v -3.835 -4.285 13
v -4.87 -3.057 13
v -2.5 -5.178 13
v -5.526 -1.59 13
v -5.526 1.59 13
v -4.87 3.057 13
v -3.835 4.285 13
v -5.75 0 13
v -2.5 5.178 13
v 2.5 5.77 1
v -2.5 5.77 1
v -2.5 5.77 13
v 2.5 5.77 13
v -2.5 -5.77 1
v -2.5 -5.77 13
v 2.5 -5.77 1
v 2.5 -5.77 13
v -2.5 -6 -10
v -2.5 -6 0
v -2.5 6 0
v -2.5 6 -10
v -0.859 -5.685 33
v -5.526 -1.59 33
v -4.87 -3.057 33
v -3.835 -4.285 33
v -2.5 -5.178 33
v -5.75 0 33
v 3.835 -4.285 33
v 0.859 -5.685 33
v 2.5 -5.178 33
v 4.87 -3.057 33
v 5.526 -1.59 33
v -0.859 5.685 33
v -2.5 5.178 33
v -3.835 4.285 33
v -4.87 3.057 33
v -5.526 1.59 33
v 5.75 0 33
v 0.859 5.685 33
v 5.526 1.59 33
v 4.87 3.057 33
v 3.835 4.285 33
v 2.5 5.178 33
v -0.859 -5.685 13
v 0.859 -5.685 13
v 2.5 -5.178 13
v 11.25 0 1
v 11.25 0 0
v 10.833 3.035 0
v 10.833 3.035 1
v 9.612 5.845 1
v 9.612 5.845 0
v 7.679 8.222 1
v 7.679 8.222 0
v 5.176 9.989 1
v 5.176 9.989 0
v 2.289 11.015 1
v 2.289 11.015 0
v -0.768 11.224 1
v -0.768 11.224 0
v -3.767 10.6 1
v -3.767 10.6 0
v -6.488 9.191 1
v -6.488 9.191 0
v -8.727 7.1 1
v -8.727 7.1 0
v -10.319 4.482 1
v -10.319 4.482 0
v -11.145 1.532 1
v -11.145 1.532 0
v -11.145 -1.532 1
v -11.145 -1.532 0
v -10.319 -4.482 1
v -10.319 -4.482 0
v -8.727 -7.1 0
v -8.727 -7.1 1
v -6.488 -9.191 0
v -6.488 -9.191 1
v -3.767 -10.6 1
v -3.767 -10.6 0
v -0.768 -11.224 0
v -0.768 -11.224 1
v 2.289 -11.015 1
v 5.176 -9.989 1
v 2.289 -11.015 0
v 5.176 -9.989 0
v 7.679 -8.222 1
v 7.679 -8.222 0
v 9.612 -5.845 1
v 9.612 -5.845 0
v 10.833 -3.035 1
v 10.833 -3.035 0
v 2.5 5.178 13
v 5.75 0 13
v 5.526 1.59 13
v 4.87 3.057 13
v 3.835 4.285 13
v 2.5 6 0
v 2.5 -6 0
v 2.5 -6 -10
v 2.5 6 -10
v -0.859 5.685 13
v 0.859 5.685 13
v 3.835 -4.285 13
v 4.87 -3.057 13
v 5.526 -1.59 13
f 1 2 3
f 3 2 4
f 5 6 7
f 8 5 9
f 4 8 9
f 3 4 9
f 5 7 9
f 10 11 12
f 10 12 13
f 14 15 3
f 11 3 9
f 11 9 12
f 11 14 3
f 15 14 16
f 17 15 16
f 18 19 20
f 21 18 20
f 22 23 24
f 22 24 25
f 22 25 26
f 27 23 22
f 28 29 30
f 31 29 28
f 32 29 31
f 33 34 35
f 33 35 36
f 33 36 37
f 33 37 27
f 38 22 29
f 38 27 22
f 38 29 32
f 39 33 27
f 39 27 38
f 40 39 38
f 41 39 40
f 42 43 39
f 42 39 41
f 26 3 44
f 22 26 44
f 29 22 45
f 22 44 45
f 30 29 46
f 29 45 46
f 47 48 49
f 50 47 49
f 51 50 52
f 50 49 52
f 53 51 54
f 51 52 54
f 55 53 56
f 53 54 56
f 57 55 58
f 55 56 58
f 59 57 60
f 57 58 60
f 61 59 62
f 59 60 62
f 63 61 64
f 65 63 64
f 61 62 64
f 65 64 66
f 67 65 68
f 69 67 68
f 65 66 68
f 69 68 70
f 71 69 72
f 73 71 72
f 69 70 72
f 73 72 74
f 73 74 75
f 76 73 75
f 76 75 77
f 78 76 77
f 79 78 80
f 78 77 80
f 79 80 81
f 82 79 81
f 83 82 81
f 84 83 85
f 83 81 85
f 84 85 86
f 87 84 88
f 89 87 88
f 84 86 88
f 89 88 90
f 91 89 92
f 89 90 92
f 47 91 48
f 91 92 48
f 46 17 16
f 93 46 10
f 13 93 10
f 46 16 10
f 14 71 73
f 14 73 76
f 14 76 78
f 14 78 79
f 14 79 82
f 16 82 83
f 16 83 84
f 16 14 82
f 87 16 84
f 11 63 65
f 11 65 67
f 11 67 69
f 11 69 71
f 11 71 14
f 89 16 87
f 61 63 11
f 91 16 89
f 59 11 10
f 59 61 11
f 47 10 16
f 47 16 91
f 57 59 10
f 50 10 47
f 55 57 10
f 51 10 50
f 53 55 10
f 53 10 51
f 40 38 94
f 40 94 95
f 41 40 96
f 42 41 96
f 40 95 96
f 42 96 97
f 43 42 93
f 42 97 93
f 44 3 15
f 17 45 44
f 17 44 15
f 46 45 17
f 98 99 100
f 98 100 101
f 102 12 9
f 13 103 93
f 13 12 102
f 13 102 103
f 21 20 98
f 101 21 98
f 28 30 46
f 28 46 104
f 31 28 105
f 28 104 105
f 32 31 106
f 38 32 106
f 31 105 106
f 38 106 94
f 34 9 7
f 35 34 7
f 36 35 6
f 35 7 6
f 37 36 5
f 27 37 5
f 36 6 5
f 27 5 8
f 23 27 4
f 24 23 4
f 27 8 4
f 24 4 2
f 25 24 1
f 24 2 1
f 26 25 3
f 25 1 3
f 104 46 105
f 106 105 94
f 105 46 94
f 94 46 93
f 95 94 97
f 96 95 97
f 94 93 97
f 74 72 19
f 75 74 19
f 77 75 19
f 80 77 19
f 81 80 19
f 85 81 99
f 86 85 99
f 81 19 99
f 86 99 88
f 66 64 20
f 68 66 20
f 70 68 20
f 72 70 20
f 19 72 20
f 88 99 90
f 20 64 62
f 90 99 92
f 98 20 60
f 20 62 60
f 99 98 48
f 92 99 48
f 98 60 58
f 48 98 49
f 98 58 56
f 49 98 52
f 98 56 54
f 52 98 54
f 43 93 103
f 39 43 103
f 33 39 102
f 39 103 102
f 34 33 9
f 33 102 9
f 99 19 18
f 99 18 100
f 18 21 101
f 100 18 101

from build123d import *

# Parameters (mm, degrees)
F0_R     = 11.25
F1_DEPTH = 1
F2_W     = 5
F2_H     = 11.54
F3_DEPTH = 12
F4_W     = 5
F4_H     = 12
F5_DEPTH = 10
F7_DEPTH = 20


with BuildPart() as f1:
    # F0 (on Top) → F1 (new body)
    with BuildSketch(Plane.XY):
        Circle(F0_R)
    extrude(amount=F1_DEPTH)

    # F2 (on face) → F3 (join)
    with BuildSketch(Plane.XY.offset(1)):
        Rectangle(F2_W, F2_H)
    extrude(amount=F3_DEPTH)

    # F4 (on Top) → F5 (join)
    with BuildSketch(Plane.XY):
        Rectangle(F4_W, F4_H)
    extrude(amount=-F5_DEPTH)

    # F6 (on face) → F7 (join)
    with BuildSketch(Plane.XY.offset(13)):
        with BuildLine():
            Line((2.5, -5.178079), (2.5, 5.178079))
            ThreePointArc((2.5, 5.178079), (0, 5.75), (-2.5, 5.178079))
            Line((-2.5, 5.178079), (-2.5, -5.178079))
            ThreePointArc((-2.5, -5.178079), (0, -5.75), (2.5, -5.178079))
        make_face()
        with BuildLine():
            Line((-2.5, -5.178079), (-2.5, 5.178079))
            ThreePointArc((-2.5, 5.178079), (-5.75, 0), (-2.5, -5.178079))
        make_face()
        with BuildLine():
            ThreePointArc((2.5, -5.178079), (4.87019, -3.056755), (5.75, 0))
            ThreePointArc((5.75, 0), (4.87019, 3.056755), (2.5, 5.178079))
            Line((2.5, 5.178079), (2.5, -5.178079))
        make_face()
    extrude(amount=F7_DEPTH)


solid = f1.part
